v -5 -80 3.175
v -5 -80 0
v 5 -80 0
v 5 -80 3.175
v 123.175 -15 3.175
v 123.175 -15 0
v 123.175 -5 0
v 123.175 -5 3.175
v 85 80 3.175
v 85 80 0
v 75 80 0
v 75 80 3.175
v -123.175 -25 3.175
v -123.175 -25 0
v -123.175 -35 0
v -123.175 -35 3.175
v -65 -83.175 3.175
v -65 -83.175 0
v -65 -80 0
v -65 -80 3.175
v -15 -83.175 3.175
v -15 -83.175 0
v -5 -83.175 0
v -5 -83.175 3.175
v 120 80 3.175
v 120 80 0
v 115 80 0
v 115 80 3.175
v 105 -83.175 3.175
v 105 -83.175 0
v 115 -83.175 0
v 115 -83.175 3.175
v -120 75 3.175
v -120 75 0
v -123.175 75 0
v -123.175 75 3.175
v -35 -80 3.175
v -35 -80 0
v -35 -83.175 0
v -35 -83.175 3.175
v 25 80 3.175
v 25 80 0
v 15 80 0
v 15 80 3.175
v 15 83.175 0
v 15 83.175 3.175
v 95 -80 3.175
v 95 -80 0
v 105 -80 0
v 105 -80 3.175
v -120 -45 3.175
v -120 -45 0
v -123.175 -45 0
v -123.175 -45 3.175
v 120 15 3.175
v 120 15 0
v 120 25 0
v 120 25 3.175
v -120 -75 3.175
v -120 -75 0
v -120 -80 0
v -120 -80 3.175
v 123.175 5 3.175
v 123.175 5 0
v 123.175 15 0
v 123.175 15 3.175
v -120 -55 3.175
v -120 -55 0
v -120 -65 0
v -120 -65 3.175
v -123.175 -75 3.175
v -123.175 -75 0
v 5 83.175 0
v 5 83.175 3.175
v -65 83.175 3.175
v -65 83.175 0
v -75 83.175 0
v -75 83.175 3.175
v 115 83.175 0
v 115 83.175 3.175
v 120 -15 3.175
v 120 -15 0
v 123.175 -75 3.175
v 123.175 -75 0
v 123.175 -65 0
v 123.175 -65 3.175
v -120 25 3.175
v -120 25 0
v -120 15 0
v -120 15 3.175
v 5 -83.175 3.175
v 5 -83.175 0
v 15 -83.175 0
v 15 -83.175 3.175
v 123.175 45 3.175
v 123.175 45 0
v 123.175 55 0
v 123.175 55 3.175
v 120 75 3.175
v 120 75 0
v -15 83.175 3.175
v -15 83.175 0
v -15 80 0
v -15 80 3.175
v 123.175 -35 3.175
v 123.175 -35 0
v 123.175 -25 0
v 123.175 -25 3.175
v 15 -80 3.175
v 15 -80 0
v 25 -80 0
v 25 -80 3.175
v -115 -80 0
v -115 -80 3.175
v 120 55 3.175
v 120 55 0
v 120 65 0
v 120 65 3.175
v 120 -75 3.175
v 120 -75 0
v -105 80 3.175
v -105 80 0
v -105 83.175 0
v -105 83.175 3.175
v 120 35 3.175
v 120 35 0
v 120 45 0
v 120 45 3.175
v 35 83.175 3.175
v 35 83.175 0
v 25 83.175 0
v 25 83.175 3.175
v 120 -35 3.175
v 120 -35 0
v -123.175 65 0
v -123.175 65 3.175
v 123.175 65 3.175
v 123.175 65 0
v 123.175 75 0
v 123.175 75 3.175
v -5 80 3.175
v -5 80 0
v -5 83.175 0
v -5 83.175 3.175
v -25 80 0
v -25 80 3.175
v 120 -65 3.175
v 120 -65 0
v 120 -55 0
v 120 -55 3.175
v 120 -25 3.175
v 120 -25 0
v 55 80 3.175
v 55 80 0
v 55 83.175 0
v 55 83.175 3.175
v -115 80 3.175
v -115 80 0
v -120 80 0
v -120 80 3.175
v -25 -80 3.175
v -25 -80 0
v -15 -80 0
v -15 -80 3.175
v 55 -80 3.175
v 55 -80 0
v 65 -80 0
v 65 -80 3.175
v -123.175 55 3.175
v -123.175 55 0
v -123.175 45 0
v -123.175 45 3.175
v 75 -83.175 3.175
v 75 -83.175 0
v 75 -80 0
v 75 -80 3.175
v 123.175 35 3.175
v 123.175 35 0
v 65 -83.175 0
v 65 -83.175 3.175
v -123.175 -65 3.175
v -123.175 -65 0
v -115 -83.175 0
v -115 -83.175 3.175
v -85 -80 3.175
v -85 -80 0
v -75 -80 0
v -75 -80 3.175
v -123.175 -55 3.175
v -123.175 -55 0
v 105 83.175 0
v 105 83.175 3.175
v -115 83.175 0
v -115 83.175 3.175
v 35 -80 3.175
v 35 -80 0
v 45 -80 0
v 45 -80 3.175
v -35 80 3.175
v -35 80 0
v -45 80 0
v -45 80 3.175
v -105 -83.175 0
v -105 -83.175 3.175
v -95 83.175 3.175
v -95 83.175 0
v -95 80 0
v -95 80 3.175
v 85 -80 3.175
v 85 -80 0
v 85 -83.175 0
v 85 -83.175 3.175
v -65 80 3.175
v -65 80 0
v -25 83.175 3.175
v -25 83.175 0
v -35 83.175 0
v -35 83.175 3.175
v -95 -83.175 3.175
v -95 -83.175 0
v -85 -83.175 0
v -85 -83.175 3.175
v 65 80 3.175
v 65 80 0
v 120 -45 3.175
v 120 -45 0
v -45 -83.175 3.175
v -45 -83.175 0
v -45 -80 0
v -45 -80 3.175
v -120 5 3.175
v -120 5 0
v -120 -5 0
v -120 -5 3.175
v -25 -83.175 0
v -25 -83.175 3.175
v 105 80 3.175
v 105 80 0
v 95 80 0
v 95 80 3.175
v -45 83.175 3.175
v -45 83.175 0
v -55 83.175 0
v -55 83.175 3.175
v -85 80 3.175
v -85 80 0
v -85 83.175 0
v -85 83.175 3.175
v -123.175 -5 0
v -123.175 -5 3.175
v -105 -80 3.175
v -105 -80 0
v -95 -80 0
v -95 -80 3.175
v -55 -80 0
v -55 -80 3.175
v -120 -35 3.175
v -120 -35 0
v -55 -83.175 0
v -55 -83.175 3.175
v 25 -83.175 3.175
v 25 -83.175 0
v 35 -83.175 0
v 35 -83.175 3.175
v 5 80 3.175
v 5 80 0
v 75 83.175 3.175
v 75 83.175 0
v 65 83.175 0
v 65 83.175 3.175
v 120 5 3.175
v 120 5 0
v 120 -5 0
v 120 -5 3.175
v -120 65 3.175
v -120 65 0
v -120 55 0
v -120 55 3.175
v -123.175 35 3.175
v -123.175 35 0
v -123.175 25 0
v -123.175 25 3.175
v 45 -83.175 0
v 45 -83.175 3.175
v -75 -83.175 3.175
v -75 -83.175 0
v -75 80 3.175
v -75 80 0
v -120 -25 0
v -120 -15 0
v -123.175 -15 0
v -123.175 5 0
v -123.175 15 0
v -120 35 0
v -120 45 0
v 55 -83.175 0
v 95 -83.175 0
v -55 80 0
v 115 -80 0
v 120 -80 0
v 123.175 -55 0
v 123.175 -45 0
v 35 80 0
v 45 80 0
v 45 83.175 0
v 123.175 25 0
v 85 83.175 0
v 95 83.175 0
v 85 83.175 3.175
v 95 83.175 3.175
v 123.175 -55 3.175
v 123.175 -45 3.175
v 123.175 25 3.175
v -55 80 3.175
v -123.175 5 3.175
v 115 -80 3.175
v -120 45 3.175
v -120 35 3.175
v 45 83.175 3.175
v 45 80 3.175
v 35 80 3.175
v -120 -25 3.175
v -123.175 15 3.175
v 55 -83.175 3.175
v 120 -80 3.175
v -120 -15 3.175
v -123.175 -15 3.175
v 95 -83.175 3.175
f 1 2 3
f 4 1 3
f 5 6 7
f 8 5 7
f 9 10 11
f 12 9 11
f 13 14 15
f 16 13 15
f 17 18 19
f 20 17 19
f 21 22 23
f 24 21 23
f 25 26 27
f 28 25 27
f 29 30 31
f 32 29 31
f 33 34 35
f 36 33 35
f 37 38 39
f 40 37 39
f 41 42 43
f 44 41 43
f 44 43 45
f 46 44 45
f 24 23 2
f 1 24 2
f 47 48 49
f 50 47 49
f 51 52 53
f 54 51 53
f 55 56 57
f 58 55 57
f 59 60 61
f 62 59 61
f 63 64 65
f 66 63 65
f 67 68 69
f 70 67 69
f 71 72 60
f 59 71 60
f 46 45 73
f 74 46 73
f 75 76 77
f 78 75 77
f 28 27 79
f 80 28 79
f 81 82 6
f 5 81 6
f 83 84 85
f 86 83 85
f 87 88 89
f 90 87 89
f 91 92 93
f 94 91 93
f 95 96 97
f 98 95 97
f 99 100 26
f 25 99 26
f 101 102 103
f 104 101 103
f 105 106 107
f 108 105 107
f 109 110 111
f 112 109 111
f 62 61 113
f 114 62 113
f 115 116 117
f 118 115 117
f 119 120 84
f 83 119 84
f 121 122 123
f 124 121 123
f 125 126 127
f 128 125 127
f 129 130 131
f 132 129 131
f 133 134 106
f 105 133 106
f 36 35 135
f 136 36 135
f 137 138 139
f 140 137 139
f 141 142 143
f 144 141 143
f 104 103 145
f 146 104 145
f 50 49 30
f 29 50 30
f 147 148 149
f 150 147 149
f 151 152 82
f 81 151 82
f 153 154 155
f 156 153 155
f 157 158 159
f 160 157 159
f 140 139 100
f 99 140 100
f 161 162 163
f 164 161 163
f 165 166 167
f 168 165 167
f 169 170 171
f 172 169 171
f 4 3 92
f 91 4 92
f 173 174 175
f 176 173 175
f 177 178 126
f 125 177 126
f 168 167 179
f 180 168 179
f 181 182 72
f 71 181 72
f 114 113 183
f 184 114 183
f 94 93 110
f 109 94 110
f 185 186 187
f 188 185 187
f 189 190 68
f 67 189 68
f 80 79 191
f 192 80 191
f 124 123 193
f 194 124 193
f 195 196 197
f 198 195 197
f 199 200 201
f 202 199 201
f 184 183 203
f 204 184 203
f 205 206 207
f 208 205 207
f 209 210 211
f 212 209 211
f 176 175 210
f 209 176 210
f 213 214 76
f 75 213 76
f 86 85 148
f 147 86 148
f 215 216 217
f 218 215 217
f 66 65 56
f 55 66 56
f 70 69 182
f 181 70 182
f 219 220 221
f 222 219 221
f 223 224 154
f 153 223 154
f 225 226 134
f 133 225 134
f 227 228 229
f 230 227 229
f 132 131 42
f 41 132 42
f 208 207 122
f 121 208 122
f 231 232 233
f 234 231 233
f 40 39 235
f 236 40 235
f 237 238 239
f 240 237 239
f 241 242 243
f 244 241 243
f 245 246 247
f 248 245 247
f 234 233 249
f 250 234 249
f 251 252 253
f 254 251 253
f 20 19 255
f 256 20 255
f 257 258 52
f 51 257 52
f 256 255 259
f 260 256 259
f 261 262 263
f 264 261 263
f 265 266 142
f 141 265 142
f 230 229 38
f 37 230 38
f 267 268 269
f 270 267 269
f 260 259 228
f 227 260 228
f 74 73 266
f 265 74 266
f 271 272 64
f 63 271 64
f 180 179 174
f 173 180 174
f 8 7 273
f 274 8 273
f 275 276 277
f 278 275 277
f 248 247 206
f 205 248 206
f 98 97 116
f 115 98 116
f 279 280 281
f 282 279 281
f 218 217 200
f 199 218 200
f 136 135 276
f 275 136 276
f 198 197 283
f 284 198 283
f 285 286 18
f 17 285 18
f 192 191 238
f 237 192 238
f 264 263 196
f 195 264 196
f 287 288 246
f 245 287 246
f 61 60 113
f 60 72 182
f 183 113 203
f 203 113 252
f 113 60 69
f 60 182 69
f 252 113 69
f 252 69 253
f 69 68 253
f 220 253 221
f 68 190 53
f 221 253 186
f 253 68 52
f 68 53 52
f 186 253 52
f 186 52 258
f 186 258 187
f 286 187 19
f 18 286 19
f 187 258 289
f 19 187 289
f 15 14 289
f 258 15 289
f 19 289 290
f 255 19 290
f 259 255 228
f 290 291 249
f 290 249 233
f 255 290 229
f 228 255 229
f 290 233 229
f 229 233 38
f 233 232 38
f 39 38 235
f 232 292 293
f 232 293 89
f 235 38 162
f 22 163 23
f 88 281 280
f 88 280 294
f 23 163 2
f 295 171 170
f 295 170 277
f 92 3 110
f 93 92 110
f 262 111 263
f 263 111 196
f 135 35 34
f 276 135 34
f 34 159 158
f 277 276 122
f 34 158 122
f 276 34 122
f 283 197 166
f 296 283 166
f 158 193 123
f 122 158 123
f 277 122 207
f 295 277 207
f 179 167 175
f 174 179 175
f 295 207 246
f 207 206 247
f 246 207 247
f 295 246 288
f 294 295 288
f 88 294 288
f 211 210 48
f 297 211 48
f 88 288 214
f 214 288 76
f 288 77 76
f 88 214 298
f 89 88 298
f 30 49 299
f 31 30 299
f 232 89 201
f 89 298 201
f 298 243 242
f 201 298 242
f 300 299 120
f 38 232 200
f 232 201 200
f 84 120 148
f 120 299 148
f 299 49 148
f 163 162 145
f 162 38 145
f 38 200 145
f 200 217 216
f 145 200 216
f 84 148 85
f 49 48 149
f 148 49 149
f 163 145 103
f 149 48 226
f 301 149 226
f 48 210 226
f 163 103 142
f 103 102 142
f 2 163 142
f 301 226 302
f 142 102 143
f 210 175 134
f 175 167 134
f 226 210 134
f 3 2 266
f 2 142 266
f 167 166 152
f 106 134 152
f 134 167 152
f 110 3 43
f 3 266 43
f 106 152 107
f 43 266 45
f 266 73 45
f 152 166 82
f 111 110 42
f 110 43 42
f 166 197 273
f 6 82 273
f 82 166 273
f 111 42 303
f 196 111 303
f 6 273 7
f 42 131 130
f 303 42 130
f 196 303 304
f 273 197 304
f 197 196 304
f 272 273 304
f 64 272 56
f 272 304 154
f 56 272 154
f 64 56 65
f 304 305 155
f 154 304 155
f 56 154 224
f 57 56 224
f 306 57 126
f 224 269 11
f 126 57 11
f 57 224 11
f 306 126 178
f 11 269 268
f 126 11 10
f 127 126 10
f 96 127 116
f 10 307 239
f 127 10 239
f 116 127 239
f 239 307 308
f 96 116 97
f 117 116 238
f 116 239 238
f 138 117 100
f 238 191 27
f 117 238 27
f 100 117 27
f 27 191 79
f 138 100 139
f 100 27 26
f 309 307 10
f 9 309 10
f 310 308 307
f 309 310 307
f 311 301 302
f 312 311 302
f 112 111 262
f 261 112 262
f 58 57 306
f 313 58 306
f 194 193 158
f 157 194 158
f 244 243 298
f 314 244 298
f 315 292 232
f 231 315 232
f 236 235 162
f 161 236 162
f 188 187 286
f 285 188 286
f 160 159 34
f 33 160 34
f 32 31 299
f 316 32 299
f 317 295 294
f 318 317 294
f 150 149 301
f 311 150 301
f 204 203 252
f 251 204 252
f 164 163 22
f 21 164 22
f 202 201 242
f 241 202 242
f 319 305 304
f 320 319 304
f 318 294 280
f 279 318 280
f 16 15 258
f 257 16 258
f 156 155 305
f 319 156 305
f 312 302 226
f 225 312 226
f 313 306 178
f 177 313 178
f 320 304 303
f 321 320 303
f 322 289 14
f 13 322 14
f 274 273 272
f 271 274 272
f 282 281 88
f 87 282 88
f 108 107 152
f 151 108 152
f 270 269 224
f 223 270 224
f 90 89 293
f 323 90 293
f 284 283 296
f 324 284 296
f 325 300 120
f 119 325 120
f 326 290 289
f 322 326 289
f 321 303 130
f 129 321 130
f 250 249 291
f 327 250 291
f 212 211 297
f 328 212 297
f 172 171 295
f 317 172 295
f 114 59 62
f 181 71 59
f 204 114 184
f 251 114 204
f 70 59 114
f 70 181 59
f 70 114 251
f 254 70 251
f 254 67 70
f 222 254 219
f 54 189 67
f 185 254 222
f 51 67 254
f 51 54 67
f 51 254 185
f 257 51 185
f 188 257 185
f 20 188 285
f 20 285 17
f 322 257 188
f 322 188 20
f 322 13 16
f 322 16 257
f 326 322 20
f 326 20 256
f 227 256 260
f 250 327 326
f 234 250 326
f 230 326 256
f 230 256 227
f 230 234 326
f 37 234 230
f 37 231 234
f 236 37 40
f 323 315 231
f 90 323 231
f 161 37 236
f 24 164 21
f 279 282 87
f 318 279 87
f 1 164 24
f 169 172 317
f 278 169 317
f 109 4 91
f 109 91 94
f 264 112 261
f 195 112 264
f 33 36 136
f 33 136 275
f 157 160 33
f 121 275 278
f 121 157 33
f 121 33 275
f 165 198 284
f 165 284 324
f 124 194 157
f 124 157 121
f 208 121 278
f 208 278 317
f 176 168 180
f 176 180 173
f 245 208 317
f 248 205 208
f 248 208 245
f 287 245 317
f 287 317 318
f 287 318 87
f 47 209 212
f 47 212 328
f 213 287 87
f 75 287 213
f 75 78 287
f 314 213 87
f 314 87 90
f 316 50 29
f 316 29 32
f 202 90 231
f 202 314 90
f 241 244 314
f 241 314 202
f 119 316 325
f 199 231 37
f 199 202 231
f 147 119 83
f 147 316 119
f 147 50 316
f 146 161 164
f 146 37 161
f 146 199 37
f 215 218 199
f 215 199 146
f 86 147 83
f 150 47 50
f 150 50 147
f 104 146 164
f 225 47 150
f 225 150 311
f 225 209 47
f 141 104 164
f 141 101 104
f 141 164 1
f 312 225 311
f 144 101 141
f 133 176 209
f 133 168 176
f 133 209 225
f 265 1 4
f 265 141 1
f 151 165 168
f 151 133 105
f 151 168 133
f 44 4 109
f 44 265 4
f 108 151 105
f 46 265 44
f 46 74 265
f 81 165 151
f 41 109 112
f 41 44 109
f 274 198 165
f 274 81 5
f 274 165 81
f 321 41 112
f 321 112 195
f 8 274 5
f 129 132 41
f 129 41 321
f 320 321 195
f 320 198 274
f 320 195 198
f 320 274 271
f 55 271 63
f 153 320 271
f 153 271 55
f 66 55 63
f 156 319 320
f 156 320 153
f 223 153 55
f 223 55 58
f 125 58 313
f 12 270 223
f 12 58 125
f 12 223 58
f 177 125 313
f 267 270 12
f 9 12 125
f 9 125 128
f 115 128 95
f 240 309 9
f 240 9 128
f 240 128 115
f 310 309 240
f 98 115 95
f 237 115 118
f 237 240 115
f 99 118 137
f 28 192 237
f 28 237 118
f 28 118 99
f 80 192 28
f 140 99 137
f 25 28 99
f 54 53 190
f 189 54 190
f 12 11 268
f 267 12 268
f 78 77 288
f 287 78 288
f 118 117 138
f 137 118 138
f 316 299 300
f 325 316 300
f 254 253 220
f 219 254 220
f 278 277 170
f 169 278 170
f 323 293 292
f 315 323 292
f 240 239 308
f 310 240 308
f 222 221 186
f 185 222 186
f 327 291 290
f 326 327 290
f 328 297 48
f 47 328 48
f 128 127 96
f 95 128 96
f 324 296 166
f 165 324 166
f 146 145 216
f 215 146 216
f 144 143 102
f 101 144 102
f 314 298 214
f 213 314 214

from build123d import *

# Parameters (mm, degrees)
F1_DEPTH = 3.175


with BuildPart() as f1:
    # F0 (on Top) → F1 (new body)
    with BuildSketch(Plane.XY):
        Polygon((120, 75), (120, 80), (115, 80), (115, 83.175), (105, 83.175), (105, 80), (95, 80), (95, 83.175), (85, 83.175), (85, 80), (75, 80), (75, 83.175), (65, 83.175), (65, 80), (55, 80), (55, 83.175), (45, 83.175), (45, 80), (35, 80), (35, 83.175), (25, 83.175), (25, 80), (15, 80), (15, 83.175), (5, 83.175), (5, 80), (0, 80), (-5, 80), (-5, 83.175), (-15, 83.175), (-15, 80), (-25, 80), (-25, 83.175), (-35, 83.175), (-35, 80), (-45, 80), (-45, 83.175), (-55, 83.175), (-55, 80), (-65, 80), (-65, 83.175), (-75, 83.175), (-75, 80), (-85, 80), (-85, 83.175), (-95, 83.175), (-95, 80), (-105, 80), (-105, 83.175), (-115, 83.175), (-115, 80), (-120, 80), (-120, 75), (-123.175, 75), (-123.175, 65), (-120, 65), (-120, 55), (-123.175, 55), (-123.175, 45), (-120, 45), (-120, 35), (-123.175, 35), (-123.175, 25), (-120, 25), (-120, 15), (-123.175, 15), (-123.175, 5), (-120, 5), (-120, 0), (-120, -5), (-123.175, -5), (-123.175, -15), (-120, -15), (-120, -25), (-123.175, -25), (-123.175, -35), (-120, -35), (-120, -45), (-123.175, -45), (-123.175, -55), (-120, -55), (-120, -65), (-123.175, -65), (-123.175, -75), (-120, -75), (-120, -80), (-115, -80), (-115, -83.175), (-105, -83.175), (-105, -80), (-95, -80), (-95, -83.175), (-85, -83.175), (-85, -80), (-75, -80), (-75, -83.175), (-65, -83.175), (-65, -80), (-55, -80), (-55, -83.175), (-45, -83.175), (-45, -80), (-35, -80), (-35, -83.175), (-25, -83.175), (-25, -80), (-15, -80), (-15, -83.175), (-5, -83.175), (-5, -80), (0, -80), (5, -80), (5, -83.175), (15, -83.175), (15, -80), (25, -80), (25, -83.175), (35, -83.175), (35, -80), (45, -80), (45, -83.175), (55, -83.175), (55, -80), (65, -80), (65, -83.175), (75, -83.175), (75, -80), (85, -80), (85, -83.175), (95, -83.175), (95, -80), (105, -80), (105, -83.175), (115, -83.175), (115, -80), (120, -80), (120, -75), (123.175, -75), (123.175, -65), (120, -65), (120, -55), (123.175, -55), (123.175, -45), (120, -45), (120, -35), (123.175, -35), (123.175, -25), (120, -25), (120, -15), (123.175, -15), (123.175, -5), (120, -5), (120, 0), (120, 5), (123.175, 5), (123.175, 15), (120, 15), (120, 25), (123.175, 25), (123.175, 35), (120, 35), (120, 45), (123.175, 45), (123.175, 55), (120, 55), (120, 65), (123.175, 65), (123.175, 75), align=None)
    extrude(amount=F1_DEPTH)


solid = f1.part
